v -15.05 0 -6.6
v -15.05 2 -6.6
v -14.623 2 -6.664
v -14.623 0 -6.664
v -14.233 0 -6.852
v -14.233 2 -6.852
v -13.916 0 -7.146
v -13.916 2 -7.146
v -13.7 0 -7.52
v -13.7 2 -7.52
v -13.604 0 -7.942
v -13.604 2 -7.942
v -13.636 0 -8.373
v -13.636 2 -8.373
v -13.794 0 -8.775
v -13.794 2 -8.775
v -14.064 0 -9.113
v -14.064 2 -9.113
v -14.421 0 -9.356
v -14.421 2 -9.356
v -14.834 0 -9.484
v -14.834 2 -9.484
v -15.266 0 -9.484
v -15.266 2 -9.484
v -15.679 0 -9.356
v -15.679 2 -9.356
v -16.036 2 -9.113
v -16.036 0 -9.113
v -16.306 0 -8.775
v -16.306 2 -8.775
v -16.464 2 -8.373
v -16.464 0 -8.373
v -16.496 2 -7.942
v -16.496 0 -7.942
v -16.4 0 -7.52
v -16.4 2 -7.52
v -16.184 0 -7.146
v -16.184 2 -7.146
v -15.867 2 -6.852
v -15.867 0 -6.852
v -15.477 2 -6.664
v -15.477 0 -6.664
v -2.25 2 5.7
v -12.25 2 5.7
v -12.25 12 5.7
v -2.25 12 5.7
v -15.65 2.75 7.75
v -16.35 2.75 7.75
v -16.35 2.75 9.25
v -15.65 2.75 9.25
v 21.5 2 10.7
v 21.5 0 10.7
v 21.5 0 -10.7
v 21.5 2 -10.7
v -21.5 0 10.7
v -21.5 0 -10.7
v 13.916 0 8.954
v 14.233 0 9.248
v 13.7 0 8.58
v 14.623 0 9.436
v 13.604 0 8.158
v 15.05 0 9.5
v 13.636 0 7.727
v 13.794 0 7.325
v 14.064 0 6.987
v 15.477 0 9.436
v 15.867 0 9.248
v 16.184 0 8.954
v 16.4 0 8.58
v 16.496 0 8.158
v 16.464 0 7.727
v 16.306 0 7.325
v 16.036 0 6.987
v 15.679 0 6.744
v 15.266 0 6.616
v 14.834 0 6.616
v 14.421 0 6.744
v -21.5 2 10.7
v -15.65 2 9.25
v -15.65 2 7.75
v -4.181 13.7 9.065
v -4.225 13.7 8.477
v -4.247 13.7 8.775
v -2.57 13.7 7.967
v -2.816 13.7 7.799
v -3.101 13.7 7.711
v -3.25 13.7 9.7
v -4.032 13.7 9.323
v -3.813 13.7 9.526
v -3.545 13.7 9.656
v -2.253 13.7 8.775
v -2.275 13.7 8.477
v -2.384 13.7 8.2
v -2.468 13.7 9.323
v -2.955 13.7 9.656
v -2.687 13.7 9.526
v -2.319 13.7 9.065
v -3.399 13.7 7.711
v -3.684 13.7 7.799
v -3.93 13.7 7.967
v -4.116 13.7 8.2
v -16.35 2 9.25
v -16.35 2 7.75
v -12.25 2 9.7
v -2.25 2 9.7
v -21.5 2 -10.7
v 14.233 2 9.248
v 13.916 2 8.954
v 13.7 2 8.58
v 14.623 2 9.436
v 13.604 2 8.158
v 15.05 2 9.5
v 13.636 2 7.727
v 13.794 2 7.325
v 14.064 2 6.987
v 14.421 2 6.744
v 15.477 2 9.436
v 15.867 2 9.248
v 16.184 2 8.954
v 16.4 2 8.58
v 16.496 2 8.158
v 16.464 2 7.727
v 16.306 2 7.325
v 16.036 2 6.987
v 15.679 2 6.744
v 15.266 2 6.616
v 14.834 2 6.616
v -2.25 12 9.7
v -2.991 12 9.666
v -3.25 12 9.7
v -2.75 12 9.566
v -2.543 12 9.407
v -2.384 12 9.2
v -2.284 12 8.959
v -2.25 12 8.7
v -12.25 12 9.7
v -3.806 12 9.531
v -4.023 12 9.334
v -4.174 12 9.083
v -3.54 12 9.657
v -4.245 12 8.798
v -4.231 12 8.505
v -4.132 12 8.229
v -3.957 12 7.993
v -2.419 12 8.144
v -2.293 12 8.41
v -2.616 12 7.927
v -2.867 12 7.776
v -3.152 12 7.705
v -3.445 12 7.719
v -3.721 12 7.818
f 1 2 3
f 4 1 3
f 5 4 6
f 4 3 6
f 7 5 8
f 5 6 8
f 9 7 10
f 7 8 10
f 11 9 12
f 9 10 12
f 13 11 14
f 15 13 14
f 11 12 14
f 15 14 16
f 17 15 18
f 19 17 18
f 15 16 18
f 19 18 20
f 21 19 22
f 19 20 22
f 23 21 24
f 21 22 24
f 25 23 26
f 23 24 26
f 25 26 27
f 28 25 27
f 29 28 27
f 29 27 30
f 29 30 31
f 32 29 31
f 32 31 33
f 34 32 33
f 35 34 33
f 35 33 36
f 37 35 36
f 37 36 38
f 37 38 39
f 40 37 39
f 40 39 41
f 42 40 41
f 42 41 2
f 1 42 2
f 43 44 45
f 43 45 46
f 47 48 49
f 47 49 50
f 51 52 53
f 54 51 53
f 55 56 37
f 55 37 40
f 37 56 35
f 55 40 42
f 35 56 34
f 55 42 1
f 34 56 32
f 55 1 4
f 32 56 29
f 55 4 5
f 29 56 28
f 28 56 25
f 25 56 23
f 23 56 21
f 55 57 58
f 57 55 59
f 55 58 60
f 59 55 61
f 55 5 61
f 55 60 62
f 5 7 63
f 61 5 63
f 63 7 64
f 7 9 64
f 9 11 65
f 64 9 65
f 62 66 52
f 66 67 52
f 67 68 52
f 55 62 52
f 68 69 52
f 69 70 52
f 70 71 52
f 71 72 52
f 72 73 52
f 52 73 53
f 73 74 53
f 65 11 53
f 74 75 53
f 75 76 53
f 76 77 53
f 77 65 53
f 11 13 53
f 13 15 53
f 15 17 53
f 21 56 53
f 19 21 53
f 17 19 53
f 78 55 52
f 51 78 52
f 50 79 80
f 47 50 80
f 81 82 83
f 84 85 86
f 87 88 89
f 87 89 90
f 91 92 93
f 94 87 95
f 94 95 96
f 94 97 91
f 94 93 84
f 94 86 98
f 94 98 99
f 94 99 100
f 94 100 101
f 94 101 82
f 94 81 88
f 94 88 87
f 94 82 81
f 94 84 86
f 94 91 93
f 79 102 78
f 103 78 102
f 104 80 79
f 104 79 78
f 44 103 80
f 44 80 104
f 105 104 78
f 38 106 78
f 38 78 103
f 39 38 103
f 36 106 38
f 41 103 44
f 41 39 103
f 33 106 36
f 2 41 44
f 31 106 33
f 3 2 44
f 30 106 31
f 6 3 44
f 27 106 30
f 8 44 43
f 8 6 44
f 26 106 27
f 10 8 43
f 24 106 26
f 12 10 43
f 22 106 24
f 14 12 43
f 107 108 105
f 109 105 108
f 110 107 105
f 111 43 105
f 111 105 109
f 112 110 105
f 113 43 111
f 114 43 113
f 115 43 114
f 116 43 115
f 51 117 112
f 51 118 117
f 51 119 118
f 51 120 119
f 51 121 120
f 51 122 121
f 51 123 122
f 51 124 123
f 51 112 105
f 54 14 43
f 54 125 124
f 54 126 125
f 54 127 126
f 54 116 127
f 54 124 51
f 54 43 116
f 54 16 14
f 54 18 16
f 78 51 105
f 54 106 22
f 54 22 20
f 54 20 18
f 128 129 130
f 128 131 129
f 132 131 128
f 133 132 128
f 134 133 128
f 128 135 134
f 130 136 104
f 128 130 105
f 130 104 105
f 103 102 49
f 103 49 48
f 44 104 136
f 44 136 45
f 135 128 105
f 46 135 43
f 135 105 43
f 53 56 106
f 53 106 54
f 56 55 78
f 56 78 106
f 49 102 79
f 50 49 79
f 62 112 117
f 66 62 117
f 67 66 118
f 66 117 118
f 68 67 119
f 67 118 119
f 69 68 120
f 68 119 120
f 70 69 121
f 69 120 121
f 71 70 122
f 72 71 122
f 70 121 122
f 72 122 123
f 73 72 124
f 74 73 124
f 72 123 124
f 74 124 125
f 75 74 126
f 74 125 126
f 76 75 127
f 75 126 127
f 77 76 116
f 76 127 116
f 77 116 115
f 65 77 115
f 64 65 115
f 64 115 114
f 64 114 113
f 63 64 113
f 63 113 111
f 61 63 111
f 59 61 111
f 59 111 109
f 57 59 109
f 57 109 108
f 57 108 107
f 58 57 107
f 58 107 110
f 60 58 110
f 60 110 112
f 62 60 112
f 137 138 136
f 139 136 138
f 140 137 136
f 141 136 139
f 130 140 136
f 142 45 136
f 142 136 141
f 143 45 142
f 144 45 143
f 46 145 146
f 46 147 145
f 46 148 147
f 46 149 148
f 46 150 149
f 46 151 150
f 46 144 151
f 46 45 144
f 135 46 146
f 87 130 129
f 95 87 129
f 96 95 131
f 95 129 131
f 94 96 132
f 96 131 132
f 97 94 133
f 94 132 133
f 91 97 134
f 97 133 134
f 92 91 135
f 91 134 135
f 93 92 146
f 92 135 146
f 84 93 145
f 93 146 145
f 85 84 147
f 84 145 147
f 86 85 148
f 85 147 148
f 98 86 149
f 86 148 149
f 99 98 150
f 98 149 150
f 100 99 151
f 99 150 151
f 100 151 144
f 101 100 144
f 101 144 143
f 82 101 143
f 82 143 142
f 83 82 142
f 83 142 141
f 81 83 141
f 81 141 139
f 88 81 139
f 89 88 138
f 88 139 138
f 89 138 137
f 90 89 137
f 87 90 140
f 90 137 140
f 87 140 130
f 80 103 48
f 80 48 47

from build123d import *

# Parameters (mm, degrees)
SKETCH1_W           = 43
SKETCH1_H           = 21.4
BOSS_EXTRUDE1_DEPTH = 2
SKETCH2_R           = 1.45
CUT_EXTRUDE1_DEPTH  = 25.098547674
SKETCH3_W           = 10
SKETCH3_H           = 4
BOSS_EXTRUDE2_DEPTH = 10
SKETCH4_R           = 1
BOSS_EXTRUDE3_DEPTH = 1.7
SKETCH5_W           = 0.7
SKETCH5_H           = 1.5
BOSS_EXTRUDE4_DEPTH = 0.75


with BuildPart() as part:
    # Sketch1 → Boss-Extrude1 (new body)
    with BuildSketch(Plane(origin=(0, 0, 0), x_dir=(1, 0, 0), z_dir=(0, 1, 0))):
        Rectangle(SKETCH1_W, SKETCH1_H)
    extrude(amount=BOSS_EXTRUDE1_DEPTH)

    # Sketch2 → Cut-Extrude1 (cut, through all)
    with BuildSketch(Plane(origin=(0, 2, 0), x_dir=(1, 0, 0), z_dir=(0, 1, 0))):
        with Locations(Location((-15.05, 8.05, 0), (0, 0, 270))):
            Circle(SKETCH2_R)
        with Locations(Location((15.05, -8.05, 0), (0, 0, 270))):
            Circle(SKETCH2_R)
    extrude(amount=-CUT_EXTRUDE1_DEPTH, mode=Mode.SUBTRACT)

    # Sketch3 → Boss-Extrude2 (add)
    with BuildSketch(Plane(origin=(0, 2, 0), x_dir=(1, 0, 0), z_dir=(0, 1, 0))):
        with Locations((-7.25, -7.7)):
            Rectangle(SKETCH3_W, SKETCH3_H)
    extrude(amount=BOSS_EXTRUDE2_DEPTH)

    # Sketch4 → Boss-Extrude3 (add)
    with BuildSketch(Plane(origin=(0, 12, 0), x_dir=(1, 0, 0), z_dir=(0, 1, 0))):
        with Locations(Location((-3.25, -8.7, 0), (0, 0, 270))):
            Circle(SKETCH4_R)
    extrude(amount=BOSS_EXTRUDE3_DEPTH)

    # Sketch5 → Boss-Extrude4 (add)
    with BuildSketch(Plane(origin=(0, 2, 0), x_dir=(1, 0, 0), z_dir=(0, 1, 0))):
        with Locations((-16, -8.5)):
            Rectangle(SKETCH5_W, SKETCH5_H)
    extrude(amount=BOSS_EXTRUDE4_DEPTH)


solid = part.part
